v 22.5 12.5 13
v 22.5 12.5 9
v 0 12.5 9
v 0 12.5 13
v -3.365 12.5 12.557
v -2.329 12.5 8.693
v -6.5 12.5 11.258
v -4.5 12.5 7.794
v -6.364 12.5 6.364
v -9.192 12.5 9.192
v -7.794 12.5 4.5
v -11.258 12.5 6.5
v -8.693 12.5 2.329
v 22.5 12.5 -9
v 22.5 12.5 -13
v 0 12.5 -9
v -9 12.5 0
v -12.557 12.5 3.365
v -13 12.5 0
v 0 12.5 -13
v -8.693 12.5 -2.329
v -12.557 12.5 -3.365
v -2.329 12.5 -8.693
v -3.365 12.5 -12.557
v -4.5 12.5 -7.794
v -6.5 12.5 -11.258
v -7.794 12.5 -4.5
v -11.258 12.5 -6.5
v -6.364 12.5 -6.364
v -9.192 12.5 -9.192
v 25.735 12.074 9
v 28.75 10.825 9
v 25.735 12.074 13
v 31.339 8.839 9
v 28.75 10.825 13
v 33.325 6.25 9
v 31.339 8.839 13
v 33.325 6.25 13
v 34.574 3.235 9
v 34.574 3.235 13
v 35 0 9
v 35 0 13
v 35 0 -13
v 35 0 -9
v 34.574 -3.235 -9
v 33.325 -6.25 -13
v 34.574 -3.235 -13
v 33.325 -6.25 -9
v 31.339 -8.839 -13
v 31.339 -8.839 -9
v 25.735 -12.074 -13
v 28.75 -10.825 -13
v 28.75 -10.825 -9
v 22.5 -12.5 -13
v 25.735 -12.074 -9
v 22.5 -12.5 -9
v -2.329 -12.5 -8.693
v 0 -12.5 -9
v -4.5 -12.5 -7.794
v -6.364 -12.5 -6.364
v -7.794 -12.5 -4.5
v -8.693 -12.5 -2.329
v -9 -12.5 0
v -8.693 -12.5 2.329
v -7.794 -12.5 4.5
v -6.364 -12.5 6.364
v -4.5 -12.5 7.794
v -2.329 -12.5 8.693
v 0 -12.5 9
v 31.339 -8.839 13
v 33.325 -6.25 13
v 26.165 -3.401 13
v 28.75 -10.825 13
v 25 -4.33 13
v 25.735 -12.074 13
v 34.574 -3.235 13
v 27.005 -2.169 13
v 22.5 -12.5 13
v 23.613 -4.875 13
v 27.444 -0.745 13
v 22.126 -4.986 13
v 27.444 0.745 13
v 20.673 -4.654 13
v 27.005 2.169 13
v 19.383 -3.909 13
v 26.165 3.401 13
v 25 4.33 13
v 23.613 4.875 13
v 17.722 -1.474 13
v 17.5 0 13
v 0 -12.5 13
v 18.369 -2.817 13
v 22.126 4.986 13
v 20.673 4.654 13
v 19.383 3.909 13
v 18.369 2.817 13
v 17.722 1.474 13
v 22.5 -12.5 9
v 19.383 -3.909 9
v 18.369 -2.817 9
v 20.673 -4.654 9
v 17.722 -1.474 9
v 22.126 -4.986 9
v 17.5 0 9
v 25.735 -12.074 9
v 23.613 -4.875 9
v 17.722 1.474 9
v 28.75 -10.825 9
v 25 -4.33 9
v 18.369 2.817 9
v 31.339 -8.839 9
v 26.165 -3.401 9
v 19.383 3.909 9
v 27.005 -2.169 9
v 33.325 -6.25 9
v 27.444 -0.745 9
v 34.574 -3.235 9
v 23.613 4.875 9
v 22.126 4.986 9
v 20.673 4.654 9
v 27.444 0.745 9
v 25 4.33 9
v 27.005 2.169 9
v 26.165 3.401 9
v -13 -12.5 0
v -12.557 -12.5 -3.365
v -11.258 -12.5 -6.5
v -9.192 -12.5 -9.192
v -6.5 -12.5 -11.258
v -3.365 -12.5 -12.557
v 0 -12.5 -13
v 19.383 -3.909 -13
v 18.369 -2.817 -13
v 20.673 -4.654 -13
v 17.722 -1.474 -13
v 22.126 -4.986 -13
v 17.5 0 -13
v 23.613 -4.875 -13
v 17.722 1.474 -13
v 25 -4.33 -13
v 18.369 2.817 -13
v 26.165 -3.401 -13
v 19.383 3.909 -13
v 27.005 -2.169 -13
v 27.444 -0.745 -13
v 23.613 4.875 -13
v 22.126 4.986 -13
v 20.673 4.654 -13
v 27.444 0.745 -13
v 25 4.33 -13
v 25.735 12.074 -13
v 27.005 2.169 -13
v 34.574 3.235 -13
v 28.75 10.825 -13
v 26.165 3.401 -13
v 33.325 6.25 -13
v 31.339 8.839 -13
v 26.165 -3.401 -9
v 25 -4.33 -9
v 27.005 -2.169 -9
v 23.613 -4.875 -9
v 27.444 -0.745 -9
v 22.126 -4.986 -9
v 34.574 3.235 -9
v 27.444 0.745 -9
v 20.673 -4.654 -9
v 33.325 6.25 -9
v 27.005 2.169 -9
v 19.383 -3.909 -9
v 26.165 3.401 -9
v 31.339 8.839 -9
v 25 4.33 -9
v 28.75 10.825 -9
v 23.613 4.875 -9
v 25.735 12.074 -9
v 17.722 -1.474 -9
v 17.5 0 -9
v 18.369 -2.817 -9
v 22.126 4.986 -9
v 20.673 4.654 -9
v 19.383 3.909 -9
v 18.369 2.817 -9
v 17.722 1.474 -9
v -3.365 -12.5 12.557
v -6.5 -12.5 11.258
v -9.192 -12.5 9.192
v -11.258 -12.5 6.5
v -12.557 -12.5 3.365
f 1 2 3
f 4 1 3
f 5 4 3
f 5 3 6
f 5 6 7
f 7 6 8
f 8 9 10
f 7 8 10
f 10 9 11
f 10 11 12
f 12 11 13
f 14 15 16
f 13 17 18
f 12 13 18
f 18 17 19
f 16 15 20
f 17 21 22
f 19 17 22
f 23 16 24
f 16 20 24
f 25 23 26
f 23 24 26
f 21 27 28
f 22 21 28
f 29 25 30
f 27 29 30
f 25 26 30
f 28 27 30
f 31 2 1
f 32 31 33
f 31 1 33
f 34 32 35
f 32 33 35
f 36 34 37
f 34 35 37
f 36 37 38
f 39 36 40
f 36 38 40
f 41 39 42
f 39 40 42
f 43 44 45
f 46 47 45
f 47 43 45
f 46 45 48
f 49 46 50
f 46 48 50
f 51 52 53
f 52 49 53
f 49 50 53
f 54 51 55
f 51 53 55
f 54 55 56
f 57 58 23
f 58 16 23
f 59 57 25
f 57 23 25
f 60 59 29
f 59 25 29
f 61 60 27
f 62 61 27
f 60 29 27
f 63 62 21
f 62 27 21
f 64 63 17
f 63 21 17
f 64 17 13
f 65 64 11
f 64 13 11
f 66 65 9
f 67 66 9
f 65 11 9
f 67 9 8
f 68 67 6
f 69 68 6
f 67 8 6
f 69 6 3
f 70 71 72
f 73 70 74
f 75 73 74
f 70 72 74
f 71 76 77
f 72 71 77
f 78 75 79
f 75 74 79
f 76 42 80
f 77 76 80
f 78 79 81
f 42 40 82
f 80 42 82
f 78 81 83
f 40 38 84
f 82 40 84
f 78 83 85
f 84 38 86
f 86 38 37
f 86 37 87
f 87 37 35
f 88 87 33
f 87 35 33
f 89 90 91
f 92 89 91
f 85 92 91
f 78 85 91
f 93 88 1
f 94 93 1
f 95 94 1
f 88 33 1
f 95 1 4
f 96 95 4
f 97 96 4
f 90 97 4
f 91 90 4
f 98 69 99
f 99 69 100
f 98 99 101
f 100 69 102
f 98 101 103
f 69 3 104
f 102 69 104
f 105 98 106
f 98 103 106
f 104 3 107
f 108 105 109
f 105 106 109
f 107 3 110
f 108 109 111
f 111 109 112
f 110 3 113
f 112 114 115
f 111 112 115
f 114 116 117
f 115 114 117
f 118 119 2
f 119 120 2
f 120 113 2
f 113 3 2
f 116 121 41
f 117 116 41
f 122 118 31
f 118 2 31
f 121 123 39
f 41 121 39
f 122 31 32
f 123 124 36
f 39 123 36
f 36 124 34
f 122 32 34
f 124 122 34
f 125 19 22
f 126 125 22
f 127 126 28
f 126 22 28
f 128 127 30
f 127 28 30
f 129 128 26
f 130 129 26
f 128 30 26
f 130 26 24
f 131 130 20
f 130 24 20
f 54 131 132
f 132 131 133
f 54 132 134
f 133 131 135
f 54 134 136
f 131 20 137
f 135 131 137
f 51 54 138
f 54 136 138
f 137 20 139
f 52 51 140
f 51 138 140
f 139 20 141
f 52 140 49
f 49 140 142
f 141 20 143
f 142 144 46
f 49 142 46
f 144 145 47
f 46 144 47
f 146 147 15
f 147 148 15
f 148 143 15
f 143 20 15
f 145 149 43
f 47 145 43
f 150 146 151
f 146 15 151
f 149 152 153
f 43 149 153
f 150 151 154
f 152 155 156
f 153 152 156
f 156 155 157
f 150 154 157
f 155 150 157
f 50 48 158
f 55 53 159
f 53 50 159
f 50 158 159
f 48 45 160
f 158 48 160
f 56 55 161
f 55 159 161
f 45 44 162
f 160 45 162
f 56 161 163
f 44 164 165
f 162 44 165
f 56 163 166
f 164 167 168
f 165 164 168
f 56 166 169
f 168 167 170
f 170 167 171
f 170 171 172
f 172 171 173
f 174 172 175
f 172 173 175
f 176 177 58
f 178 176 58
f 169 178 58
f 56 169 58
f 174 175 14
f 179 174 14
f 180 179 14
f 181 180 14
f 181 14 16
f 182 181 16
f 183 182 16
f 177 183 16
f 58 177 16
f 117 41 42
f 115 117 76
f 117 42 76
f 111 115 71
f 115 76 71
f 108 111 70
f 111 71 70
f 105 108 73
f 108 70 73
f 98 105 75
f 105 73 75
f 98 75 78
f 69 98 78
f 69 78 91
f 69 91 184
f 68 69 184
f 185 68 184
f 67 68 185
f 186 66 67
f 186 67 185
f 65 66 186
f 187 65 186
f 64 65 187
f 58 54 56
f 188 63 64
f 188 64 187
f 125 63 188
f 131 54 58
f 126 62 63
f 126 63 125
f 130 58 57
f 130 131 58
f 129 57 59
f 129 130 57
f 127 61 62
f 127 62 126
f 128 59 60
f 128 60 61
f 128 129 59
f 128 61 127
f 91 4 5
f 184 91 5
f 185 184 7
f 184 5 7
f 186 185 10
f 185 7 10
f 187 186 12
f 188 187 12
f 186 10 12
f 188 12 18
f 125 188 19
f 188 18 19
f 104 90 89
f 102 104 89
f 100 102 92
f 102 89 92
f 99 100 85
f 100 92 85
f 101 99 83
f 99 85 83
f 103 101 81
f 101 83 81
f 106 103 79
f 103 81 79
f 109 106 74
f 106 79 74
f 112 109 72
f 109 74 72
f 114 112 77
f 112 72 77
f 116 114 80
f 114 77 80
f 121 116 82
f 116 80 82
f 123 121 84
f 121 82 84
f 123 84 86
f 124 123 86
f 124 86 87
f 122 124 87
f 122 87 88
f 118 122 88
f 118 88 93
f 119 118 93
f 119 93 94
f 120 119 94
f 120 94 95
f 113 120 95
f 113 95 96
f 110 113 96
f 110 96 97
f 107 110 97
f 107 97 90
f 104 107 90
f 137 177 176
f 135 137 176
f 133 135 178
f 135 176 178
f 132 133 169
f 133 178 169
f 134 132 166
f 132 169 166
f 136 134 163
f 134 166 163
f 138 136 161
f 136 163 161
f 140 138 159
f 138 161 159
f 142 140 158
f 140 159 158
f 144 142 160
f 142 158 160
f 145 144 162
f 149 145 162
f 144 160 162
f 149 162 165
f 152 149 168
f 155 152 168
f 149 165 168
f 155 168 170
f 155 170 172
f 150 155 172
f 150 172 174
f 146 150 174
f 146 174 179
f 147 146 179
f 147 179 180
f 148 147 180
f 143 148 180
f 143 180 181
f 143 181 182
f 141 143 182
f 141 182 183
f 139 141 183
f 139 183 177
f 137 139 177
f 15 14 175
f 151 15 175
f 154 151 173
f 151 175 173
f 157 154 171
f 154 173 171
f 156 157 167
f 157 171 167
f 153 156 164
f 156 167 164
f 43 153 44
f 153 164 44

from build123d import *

# Parameters (mm, degrees)
BOSS_EXTRUDE1_DEPTH = 12.5
CUT_EXTRUDE1_DEPTH  = 46.356917885


with BuildPart() as part:
    # Sketch1 → Boss-Extrude1 (new, symmetric)
    with BuildSketch(Plane(origin=(0, 0, 0), x_dir=(1, 0, 0), z_dir=(0, 1, 0))):
        with BuildLine():
            Line((0, 13), (35, 13))
            Line((35, 13), (35, 9))
            Line((35, 9), (0, 9))
            ThreePointArc((0, 9), (-6.363961031, 6.363961031), (-9, 0))
            ThreePointArc((-9, 0), (-6.363961031, -6.363961031), (0, -9))
            Line((0, -9), (35, -9))
            Line((35, -9), (35, -13))
            Line((35, -13), (0, -13))
            ThreePointArc((0, -13), (-9.192388155, -9.192388155), (-13, 0))
            ThreePointArc((-13, 0), (-9.192388155, 9.192388155), (0, 13))
        make_face()
    extrude(amount=BOSS_EXTRUDE1_DEPTH, both=True)

    # Sketch2 → Cut-Extrude1 (cut, through all)
    with BuildSketch(Plane.XY.offset(13)):
        with BuildLine():
            ThreePointArc((27.5, 0), (22.5, 5), (17.5, 0))
            Line((17.5, 0), (27.5, 0))
        make_face()
        with BuildLine():
            Line((27.5, 0), (17.5, 0))
            ThreePointArc((17.5, 0), (22.5, -5), (27.5, 0))
        make_face()
        with BuildLine():
            ThreePointArc((22.5, 12.5), (31.338834755, 8.838834775), (35, 2.9e-08))
            Line((35, 2.9e-08), (35, 12.5))
            Line((35, 12.5), (22.5, 12.5))
        make_face()
        with BuildLine():
            Line((35, -12.5), (35, 2.9e-08))
            ThreePointArc((35, 2.9e-08), (31.338834775, -8.838834755), (22.5, -12.5))
            Line((22.5, -12.5), (35, -12.5))
        make_face()
    extrude(amount=-CUT_EXTRUDE1_DEPTH, mode=Mode.SUBTRACT)


solid = part.part
